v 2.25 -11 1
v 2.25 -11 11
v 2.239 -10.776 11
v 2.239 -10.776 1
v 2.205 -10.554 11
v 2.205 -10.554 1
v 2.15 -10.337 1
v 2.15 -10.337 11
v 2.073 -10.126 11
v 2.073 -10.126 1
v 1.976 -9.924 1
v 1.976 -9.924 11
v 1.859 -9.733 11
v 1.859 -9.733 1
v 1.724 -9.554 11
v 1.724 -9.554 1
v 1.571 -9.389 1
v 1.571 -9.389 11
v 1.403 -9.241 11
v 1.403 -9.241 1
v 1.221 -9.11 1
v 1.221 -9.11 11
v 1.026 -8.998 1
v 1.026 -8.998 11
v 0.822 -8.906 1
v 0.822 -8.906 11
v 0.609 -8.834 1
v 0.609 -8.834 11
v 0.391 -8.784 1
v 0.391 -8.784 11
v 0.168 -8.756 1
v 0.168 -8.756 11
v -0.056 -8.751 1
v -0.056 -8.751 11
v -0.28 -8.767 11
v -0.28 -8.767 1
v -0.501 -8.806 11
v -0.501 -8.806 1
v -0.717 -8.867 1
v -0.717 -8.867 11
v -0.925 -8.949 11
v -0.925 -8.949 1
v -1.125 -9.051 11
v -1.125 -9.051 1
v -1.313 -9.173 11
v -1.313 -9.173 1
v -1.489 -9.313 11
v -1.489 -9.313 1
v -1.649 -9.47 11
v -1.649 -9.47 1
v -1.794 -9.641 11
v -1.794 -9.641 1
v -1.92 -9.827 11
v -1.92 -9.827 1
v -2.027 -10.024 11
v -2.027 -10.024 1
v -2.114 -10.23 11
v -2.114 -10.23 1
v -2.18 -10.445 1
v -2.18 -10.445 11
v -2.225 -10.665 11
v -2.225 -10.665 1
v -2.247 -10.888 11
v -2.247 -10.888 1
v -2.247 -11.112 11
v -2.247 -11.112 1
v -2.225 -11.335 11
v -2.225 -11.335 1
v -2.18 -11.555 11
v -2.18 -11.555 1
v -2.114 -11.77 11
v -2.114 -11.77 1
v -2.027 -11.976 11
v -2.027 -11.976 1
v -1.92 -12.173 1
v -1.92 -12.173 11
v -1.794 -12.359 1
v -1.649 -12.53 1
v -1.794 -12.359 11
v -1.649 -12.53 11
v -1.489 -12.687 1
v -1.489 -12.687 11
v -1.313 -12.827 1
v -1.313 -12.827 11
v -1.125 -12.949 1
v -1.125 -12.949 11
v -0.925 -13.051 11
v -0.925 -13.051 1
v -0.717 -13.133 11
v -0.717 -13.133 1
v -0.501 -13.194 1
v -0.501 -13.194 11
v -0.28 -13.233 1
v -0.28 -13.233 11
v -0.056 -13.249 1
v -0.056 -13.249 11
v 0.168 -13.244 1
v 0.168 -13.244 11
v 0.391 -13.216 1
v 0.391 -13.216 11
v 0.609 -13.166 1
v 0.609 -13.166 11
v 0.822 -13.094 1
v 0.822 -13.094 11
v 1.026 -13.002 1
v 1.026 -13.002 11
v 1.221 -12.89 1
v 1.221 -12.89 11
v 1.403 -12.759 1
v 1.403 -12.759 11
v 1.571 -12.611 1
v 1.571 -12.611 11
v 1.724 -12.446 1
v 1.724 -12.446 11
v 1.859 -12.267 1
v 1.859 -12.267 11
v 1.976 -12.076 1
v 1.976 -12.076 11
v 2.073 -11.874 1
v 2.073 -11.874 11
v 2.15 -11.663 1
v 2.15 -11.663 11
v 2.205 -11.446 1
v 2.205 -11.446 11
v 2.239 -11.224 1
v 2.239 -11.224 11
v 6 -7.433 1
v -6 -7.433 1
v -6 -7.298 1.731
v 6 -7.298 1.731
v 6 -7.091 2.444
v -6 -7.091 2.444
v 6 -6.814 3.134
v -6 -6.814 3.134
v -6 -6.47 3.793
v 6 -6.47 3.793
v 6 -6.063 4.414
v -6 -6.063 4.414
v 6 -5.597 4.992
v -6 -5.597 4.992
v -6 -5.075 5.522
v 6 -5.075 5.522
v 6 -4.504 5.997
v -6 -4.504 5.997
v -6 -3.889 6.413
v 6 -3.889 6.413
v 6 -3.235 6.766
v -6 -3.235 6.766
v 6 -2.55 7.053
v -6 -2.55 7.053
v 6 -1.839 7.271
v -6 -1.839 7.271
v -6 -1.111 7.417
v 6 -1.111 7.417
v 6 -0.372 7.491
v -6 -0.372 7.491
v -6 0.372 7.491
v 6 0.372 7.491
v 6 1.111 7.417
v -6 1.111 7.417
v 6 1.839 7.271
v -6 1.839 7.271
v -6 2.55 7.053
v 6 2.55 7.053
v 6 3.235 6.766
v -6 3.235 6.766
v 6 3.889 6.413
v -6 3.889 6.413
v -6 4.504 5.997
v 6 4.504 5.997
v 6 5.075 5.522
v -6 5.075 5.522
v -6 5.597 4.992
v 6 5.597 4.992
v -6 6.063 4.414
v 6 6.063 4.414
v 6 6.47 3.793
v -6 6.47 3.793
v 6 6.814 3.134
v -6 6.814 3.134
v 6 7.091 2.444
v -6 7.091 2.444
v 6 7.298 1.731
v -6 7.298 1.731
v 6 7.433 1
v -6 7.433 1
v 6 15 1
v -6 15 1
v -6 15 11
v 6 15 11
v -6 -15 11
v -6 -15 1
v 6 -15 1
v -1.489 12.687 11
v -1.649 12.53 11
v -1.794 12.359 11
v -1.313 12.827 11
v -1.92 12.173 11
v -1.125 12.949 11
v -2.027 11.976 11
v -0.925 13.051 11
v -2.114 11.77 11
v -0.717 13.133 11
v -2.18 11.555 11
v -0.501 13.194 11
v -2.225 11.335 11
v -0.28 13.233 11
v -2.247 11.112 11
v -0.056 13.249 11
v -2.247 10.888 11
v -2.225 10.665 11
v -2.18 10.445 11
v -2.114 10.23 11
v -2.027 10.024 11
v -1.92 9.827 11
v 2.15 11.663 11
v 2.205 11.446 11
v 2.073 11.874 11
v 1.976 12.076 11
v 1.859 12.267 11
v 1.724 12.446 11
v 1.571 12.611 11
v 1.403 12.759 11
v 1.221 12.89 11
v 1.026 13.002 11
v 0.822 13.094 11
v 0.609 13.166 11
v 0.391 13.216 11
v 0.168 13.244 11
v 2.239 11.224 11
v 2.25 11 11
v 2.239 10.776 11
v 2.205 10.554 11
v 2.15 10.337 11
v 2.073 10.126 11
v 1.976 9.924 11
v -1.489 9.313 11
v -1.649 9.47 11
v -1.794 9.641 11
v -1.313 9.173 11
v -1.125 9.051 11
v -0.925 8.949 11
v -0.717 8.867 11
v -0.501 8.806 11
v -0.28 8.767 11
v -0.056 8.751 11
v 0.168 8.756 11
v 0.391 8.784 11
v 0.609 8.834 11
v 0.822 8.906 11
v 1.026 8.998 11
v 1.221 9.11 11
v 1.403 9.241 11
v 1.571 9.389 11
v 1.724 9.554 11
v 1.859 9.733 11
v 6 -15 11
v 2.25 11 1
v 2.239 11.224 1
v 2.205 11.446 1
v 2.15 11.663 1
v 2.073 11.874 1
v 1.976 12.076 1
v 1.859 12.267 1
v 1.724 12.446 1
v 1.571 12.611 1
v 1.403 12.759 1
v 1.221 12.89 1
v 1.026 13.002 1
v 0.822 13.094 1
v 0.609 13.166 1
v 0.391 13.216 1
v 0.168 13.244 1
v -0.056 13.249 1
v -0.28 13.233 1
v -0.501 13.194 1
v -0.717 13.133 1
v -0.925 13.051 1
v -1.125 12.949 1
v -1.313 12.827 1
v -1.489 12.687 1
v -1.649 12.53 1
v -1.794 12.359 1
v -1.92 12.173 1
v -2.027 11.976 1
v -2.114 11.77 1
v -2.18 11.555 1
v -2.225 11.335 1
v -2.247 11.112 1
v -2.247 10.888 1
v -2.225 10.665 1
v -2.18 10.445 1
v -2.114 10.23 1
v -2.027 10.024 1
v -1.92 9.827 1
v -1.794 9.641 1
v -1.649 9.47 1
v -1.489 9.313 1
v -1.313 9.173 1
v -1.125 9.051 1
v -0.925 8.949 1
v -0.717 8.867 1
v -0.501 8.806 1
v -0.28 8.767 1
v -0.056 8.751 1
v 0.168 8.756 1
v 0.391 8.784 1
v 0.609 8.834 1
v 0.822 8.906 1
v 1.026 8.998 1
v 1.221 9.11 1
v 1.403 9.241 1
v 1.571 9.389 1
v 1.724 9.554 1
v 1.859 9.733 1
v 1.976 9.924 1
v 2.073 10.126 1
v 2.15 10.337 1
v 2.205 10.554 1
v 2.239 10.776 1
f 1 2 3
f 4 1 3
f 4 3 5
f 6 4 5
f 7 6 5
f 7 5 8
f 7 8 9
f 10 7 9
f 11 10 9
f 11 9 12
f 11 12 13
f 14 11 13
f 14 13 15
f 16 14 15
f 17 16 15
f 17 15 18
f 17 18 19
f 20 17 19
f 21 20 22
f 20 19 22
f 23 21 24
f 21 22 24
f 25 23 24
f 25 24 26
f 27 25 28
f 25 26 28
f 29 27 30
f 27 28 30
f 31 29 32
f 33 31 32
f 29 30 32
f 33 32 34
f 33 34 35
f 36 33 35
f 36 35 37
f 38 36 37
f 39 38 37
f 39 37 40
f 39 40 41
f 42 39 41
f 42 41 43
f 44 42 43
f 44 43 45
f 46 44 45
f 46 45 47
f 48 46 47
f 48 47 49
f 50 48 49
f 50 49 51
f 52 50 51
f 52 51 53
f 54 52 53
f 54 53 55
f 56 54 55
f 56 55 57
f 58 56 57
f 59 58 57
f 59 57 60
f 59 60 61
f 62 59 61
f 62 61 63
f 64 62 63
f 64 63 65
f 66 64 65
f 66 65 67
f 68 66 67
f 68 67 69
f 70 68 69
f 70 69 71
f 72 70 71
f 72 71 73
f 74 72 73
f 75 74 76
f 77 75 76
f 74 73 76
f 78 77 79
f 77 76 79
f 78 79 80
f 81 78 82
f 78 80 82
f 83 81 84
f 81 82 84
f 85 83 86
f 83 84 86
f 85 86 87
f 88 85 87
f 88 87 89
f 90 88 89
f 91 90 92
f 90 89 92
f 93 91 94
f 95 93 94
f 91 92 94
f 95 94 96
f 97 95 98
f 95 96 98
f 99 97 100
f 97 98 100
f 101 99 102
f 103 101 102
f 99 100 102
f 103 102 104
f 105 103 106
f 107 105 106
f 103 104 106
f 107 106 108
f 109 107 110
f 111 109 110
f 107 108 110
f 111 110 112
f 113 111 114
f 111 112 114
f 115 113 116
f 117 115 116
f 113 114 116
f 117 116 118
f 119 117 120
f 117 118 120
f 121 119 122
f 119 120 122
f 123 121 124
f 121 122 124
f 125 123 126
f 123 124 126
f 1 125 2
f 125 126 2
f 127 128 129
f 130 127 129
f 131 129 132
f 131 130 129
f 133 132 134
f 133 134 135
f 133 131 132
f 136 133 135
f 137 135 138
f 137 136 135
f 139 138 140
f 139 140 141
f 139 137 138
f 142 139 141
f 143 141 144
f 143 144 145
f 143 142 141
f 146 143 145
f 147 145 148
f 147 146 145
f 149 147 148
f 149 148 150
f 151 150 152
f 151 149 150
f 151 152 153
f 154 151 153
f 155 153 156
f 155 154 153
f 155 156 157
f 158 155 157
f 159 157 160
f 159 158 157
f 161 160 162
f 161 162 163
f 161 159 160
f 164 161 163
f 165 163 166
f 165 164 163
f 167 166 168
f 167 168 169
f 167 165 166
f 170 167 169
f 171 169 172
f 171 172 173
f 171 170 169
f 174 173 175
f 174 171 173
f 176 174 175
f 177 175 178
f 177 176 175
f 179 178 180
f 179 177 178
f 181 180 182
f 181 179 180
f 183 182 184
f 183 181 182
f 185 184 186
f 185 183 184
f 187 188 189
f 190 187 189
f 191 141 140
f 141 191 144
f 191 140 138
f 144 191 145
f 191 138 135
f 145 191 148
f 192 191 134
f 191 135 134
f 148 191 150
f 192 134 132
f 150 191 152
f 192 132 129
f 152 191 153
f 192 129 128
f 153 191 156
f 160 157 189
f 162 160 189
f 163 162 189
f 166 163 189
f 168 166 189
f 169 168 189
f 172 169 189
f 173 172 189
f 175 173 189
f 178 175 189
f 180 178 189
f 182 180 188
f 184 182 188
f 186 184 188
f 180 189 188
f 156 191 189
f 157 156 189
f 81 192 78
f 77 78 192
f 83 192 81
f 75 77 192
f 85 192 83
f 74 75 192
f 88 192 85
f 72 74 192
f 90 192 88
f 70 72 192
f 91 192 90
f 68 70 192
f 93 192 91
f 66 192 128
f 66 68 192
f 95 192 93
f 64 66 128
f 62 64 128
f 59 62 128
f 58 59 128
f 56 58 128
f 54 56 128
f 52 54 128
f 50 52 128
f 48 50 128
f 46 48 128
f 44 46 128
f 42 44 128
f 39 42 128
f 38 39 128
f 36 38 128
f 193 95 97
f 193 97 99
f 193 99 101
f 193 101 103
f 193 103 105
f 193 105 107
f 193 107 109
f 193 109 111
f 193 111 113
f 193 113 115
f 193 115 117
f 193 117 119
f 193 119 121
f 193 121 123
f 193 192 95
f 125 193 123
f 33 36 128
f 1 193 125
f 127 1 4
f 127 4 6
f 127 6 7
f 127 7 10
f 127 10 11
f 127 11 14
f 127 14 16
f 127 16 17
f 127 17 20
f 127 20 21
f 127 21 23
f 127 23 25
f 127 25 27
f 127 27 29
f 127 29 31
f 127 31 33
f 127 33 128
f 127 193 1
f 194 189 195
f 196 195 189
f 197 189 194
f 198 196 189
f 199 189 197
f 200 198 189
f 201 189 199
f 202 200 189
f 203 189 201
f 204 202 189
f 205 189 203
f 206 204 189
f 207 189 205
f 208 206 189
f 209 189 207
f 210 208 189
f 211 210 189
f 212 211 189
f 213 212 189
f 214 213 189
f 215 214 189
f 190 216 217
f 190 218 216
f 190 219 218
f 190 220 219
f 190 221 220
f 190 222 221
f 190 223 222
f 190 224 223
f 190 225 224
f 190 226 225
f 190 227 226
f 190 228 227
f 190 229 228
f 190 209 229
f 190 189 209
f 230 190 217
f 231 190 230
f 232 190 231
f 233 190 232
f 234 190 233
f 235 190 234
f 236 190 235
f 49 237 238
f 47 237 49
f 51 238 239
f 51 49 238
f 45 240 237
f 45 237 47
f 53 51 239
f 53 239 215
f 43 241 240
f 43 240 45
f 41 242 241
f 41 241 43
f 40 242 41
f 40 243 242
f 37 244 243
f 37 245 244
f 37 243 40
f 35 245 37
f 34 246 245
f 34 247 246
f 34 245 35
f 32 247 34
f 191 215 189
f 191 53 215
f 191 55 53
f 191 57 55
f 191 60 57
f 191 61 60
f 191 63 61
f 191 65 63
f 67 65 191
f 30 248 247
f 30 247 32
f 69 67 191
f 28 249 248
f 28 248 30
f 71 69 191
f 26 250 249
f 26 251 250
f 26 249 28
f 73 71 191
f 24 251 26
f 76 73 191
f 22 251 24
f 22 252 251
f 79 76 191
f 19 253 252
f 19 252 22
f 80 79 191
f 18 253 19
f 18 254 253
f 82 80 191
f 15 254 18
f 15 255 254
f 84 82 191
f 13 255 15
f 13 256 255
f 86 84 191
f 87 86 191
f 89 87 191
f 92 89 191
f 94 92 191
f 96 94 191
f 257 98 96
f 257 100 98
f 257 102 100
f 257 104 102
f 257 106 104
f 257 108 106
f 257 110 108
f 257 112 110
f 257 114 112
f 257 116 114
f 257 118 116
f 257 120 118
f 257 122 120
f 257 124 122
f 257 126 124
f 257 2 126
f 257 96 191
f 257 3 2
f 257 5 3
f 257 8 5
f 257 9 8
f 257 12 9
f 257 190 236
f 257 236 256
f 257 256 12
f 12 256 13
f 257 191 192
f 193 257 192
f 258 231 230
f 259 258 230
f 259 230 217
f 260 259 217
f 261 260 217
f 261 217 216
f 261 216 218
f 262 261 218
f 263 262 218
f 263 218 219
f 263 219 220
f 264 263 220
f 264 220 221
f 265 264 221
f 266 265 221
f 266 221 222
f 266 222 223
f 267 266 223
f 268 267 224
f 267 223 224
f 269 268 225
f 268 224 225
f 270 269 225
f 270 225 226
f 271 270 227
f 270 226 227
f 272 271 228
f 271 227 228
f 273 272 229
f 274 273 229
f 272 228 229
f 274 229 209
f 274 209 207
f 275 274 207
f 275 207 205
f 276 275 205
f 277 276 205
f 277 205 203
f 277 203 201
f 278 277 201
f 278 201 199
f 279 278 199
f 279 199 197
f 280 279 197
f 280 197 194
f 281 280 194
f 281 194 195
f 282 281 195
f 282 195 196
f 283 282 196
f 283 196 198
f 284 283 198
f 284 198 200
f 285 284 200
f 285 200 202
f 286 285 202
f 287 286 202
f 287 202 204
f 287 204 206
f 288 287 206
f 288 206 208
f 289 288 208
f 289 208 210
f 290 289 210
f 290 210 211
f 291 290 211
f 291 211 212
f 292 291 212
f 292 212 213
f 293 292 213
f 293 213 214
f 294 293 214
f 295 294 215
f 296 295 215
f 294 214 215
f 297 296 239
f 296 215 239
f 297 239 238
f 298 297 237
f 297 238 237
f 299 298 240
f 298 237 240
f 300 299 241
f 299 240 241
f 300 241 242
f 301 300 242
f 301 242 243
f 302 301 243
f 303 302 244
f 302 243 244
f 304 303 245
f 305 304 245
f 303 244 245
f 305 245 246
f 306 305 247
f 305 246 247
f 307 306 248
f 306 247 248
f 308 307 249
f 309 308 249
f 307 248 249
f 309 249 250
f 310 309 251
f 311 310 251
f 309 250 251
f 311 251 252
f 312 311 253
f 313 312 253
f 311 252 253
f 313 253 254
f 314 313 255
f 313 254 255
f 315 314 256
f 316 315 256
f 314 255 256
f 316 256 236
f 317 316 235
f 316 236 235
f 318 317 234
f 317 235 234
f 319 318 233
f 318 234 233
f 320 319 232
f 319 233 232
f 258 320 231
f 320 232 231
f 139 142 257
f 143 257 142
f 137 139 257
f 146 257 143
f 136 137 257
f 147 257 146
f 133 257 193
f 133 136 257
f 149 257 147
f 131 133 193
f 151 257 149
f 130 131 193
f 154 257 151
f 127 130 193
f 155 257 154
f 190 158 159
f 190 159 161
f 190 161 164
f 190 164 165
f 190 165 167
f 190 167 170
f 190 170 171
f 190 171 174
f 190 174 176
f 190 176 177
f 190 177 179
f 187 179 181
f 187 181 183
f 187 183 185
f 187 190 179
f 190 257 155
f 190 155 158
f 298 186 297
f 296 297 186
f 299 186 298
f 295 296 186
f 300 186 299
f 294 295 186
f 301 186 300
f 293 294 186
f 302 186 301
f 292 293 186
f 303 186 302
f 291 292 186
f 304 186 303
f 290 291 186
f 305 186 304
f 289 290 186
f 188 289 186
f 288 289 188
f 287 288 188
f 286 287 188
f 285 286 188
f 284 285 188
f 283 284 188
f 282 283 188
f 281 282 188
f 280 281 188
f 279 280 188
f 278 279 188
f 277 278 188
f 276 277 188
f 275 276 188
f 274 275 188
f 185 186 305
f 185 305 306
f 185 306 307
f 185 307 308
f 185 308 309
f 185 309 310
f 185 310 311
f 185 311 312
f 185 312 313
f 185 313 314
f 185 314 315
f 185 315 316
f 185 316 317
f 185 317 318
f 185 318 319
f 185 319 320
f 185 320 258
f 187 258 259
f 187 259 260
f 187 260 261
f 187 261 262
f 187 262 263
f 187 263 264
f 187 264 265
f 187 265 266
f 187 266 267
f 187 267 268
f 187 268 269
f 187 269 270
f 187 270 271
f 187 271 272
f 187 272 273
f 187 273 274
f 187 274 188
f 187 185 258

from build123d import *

# Parameters (mm, degrees)
BOSS_EXTRUDE1_DEPTH = 6
SKETCH2_R           = 2.25
CUT_EXTRUDE1_DEPTH  = 20


with BuildPart() as part:
    # Sketch1 → Boss-Extrude1 (new, symmetric)
    with BuildSketch(Plane(origin=(0, 0, 0), x_dir=(0, 0, -1), z_dir=(1, 0, 0))):
        with BuildLine():
            Line((-1, 7.433034374), (-1, 15))
            Line((-1, 15), (-11, 15))
            Line((-11, 15), (-11, -15))
            Line((-11, -15), (-1, -15))
            Line((-1, -15), (-1, -7.433034374))
            ThreePointArc((-1, -7.433034374), (-7.5, 0), (-1, 7.433034374))
        make_face()
    extrude(amount=BOSS_EXTRUDE1_DEPTH, both=True)

    # Sketch2 → Cut-Extrude1 (cut, through all)
    with BuildSketch(Plane.XY.offset(11)):
        with Locations((0, 11)):
            Circle(SKETCH2_R)
        with Locations((0, -11)):
            Circle(SKETCH2_R)
    extrude(amount=-CUT_EXTRUDE1_DEPTH, mode=Mode.SUBTRACT)


solid = part.part
